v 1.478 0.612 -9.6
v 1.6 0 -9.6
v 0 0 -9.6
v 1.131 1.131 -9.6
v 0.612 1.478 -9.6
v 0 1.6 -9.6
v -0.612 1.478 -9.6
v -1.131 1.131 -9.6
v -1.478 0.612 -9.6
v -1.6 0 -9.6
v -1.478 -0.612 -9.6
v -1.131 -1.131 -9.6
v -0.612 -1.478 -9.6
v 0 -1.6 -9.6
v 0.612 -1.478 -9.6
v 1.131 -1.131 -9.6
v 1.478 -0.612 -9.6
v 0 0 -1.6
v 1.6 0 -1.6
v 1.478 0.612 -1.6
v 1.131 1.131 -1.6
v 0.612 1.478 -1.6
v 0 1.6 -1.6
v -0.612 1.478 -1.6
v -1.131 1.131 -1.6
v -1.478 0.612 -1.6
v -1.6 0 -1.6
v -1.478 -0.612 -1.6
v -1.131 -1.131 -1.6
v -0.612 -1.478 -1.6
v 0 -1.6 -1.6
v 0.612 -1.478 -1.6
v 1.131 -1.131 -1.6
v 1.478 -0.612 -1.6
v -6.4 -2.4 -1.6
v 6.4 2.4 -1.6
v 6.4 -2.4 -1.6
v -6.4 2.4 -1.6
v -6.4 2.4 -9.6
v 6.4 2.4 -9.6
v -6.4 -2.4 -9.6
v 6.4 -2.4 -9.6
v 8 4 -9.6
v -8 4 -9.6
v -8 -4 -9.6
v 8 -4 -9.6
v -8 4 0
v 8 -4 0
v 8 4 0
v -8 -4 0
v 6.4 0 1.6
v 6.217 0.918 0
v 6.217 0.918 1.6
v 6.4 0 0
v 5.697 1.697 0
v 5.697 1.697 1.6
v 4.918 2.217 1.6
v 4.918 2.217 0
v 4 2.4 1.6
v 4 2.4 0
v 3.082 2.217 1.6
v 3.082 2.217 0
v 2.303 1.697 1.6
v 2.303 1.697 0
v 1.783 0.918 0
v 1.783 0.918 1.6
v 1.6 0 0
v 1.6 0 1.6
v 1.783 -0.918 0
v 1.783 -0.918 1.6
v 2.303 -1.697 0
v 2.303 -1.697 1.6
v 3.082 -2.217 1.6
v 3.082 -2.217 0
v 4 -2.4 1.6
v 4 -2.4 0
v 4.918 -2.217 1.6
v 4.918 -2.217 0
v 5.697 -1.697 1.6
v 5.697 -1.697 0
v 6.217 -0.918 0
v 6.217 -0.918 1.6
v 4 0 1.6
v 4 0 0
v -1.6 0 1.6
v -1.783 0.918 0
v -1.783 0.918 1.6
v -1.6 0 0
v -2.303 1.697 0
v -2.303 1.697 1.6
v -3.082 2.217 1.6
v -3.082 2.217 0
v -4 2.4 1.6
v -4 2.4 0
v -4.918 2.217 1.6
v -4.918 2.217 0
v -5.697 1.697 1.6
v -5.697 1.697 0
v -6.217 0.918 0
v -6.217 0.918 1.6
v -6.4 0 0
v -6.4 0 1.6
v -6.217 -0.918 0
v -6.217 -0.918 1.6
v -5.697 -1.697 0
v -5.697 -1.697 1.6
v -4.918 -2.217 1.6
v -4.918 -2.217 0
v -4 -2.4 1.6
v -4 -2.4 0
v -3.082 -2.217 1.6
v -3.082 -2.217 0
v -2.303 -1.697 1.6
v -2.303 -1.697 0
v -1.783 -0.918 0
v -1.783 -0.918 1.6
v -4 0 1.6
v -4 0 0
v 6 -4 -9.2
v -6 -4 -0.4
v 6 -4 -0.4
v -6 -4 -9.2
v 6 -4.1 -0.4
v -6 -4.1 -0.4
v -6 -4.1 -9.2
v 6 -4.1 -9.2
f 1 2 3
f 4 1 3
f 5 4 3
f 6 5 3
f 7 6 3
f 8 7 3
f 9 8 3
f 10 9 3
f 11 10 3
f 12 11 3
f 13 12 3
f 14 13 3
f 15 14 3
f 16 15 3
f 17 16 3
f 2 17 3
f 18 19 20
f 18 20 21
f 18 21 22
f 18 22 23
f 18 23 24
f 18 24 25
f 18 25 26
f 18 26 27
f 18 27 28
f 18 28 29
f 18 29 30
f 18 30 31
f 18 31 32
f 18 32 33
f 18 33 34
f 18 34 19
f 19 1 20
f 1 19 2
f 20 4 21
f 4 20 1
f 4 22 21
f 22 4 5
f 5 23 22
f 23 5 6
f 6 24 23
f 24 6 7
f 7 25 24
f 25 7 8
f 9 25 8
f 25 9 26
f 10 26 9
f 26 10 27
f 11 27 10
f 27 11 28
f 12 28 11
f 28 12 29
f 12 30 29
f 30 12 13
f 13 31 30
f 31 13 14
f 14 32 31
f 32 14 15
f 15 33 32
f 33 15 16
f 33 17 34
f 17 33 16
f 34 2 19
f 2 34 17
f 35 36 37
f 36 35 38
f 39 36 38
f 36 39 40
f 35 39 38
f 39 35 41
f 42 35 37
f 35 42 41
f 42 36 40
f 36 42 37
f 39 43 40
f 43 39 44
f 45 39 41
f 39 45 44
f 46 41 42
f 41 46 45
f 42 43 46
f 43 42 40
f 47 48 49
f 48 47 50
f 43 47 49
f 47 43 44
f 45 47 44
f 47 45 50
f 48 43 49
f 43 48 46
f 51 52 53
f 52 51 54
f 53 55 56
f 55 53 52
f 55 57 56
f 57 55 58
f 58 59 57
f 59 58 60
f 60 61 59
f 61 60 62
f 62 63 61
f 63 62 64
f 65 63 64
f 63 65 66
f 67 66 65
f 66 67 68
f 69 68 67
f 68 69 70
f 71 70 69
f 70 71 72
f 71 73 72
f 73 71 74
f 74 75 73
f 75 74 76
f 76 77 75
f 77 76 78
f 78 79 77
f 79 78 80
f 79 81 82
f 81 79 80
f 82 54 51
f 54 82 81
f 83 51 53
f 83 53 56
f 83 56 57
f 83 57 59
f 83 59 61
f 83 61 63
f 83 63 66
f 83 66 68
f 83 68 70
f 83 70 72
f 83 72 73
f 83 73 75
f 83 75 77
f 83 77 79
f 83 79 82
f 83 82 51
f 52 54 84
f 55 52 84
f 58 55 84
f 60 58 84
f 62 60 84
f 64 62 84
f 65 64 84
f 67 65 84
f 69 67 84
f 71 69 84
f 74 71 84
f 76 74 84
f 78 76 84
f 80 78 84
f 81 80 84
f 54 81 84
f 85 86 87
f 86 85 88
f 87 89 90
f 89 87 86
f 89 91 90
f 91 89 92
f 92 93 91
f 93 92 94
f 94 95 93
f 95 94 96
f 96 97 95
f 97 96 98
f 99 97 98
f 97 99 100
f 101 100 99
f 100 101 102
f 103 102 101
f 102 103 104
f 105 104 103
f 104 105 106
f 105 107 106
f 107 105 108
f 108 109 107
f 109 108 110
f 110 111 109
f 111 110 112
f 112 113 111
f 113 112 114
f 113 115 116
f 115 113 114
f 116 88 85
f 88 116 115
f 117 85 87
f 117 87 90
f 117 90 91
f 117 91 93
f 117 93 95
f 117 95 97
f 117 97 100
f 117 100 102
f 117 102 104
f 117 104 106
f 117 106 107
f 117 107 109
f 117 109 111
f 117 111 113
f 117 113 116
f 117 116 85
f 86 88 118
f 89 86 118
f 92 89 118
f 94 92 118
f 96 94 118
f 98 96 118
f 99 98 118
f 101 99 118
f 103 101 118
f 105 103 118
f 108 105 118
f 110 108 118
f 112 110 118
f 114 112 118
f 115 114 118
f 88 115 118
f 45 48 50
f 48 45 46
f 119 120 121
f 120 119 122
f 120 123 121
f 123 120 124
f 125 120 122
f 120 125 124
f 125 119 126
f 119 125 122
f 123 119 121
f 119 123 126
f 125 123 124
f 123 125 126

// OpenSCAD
// file: ../p/4-4edge.scad
use <../lib.scad>
function ldraw_lib__4_4edge() = [
// 0 Circle 1.0
// 0 Name: 4-4edge.dat
// 0 Author: James Jessiman
// 0 !LDRAW_ORG Primitive UPDATE 2017-01
// 0 !LICENSE Licensed under CC BY 2.0 and CC BY 4.0 : see CAreadme.txt
// 
// 0 BFC CERTIFY CCW
  [0,"BFC","CERTIFY"],
  [0,"BFC","CCW"],
// 
// 0 !HISTORY 1998-12-15 [PTadmin] Official Update 1998-10
// 0 !HISTORY 2005-12-28 [PTadmin] Official Update 2005-01
// 0 !HISTORY 2007-06-24 [PTadmin] Header formatted for Contributor Agreement
// 0 !HISTORY 2008-07-01 [PTadmin] Official Update 2008-01
// 0 !HISTORY 2017-01-15 [Steffen] BFCed
// 0 !HISTORY 2017-12-30 [PTadmin] Official Update 2017-01
// 
// 
// 2 24 1 0 0 0.9239 0 0.3827
  [2,24,1,0,0,0.9239,0,0.3827],
// 2 24 0.9239 0 0.3827 0.7071 0 0.7071
  [2,24,0.9239,0,0.3827,0.7071,0,0.7071],
// 2 24 0.7071 0 0.7071 0.3827 0 0.9239
  [2,24,0.7071,0,0.7071,0.3827,0,0.9239],
// 2 24 0.3827 0 0.9239 0 0 1
  [2,24,0.3827,0,0.9239,0,0,1],
// 2 24 0 0 1 -0.3827 0 0.9239
  [2,24,0,0,1,-0.3827,0,0.9239],
// 2 24 -0.3827 0 0.9239 -0.7071 0 0.7071
  [2,24,-0.3827,0,0.9239,-0.7071,0,0.7071],
// 2 24 -0.7071 0 0.7071 -0.9239 0 0.3827
  [2,24,-0.7071,0,0.7071,-0.9239,0,0.3827],
// 2 24 -0.9239 0 0.3827 -1 0 -0
  [2,24,-0.9239,0,0.3827,-1,0,-0],
// 2 24 -1 0 -0 -0.9239 0 -0.3827
  [2,24,-1,0,-0,-0.9239,0,-0.3827],
// 2 24 -0.9239 0 -0.3827 -0.7071 0 -0.7071
  [2,24,-0.9239,0,-0.3827,-0.7071,0,-0.7071],
// 2 24 -0.7071 0 -0.7071 -0.3827 0 -0.9239
  [2,24,-0.7071,0,-0.7071,-0.3827,0,-0.9239],
// 2 24 -0.3827 0 -0.9239 0 0 -1
  [2,24,-0.3827,0,-0.9239,0,0,-1],
// 2 24 0 0 -1 0.3827 0 -0.9239
  [2,24,0,0,-1,0.3827,0,-0.9239],
// 2 24 0.3827 0 -0.9239 0.7071 0 -0.7071
  [2,24,0.3827,0,-0.9239,0.7071,0,-0.7071],
// 2 24 0.7071 0 -0.7071 0.9239 0 -0.3827
  [2,24,0.7071,0,-0.7071,0.9239,0,-0.3827],
// 2 24 0.9239 0 -0.3827 1 0 0
  [2,24,0.9239,0,-0.3827,1,0,0],
];
module ldraw_lib__4_4edge(step=0, col=false, unit=2/5, alt=false, line=0.2, solid=!$preview)
    makepoly(ldraw_lib__4_4edge(), step=step, col=col, unit=unit, alt=alt, line=line, solid=solid);
ldraw_lib__4_4edge(line=0.2);
// file: ../p/4-4disc.scad
use <../lib.scad>
function ldraw_lib__4_4disc() = [
// 0 Disc 1.0
// 0 Name: 4-4disc.dat
// 0 Author: James Jessiman
// 0 !LDRAW_ORG Primitive UPDATE 2002-02
// 0 !LICENSE Licensed under CC BY 2.0 and CC BY 4.0 : see CAreadme.txt
// 
// 0 BFC CERTIFY CCW
  [0,"BFC","CERTIFY"],
  [0,"BFC","CCW"],
// 
// 0 !HISTORY 1998-12-15 [PTadmin] Official Update 1998-10
// 0 !HISTORY 2002-03-23 [sbliss] Added BFC statement
// 0 !HISTORY 2002-04-25 [PTadmin] Official Update 2002-02
// 0 !HISTORY 2007-06-24 [PTadmin] Header formatted for Contributor Agreement
// 0 !HISTORY 2008-07-01 [PTadmin] Official Update 2008-01
// 
// 
// 3 16 0 0 0 1 0 0 0.9239 0 0.3827
  [3,16,0,0,0,1,0,0,0.9239,0,0.3827],
// 3 16 0 0 0 0.9239 0 0.3827 0.7071 0 0.7071
  [3,16,0,0,0,0.9239,0,0.3827,0.7071,0,0.7071],
// 3 16 0 0 0 0.7071 0 0.7071 0.3827 0 0.9239
  [3,16,0,0,0,0.7071,0,0.7071,0.3827,0,0.9239],
// 3 16 0 0 0 0.3827 0 0.9239 0 0 1
  [3,16,0,0,0,0.3827,0,0.9239,0,0,1],
// 3 16 0 0 0 0 0 1 -0.3827 0 0.9239
  [3,16,0,0,0,0,0,1,-0.3827,0,0.9239],
// 3 16 0 0 0 -0.3827 0 0.9239 -0.7071 0 0.7071
  [3,16,0,0,0,-0.3827,0,0.9239,-0.7071,0,0.7071],
// 3 16 0 0 0 -0.7071 0 0.7071 -0.9239 0 0.3827
  [3,16,0,0,0,-0.7071,0,0.7071,-0.9239,0,0.3827],
// 3 16 0 0 0 -0.9239 0 0.3827 -1 0 -0
  [3,16,0,0,0,-0.9239,0,0.3827,-1,0,-0],
// 3 16 0 0 0 -1 0 -0 -0.9239 0 -0.3827
  [3,16,0,0,0,-1,0,-0,-0.9239,0,-0.3827],
// 3 16 0 0 0 -0.9239 0 -0.3827 -0.7071 0 -0.7071
  [3,16,0,0,0,-0.9239,0,-0.3827,-0.7071,0,-0.7071],
// 3 16 0 0 0 -0.7071 0 -0.7071 -0.3827 0 -0.9239
  [3,16,0,0,0,-0.7071,0,-0.7071,-0.3827,0,-0.9239],
// 3 16 0 0 0 -0.3827 0 -0.9239 0 0 -1
  [3,16,0,0,0,-0.3827,0,-0.9239,0,0,-1],
// 3 16 0 0 0 0 0 -1 0.3827 0 -0.9239
  [3,16,0,0,0,0,0,-1,0.3827,0,-0.9239],
// 3 16 0 0 0 0.3827 0 -0.9239 0.7071 0 -0.7071
  [3,16,0,0,0,0.3827,0,-0.9239,0.7071,0,-0.7071],
// 3 16 0 0 0 0.7071 0 -0.7071 0.9239 0 -0.3827
  [3,16,0,0,0,0.7071,0,-0.7071,0.9239,0,-0.3827],
// 3 16 0 0 0 0.9239 0 -0.3827 1 0 0
  [3,16,0,0,0,0.9239,0,-0.3827,1,0,0],
// 0
];
module ldraw_lib__4_4disc(step=0, col=false, unit=2/5, alt=false, line=0.2, solid=!$preview)
    makepoly(ldraw_lib__4_4disc(), step=step, col=col, unit=unit, alt=alt, line=line, solid=solid);
ldraw_lib__4_4disc(line=0.2);
// file: ../p/4-4cyli.scad
use <../lib.scad>
$fa=1; $fs=0.2;
function ldraw_lib__4_4cyli(realsolid=false) = [
// 0 Cylinder 1.0
// 0 Name: 4-4cyli.dat
// 0 Author: James Jessiman
// 0 !LDRAW_ORG Primitive UPDATE 2005-01
// 0 !LICENSE Licensed under CC BY 2.0 and CC BY 4.0 : see CAreadme.txt
// 
// 0 BFC CERTIFY CCW
  [0,"BFC","CERTIFY"],
  [0,"BFC","CCW"],
// 
// 0 !HISTORY 1998-12-15 [PTadmin] Official Update 1998-10
// 0 !HISTORY 2002-03-23 [sbliss] Added BFC statement; merged headers from files in distributions LDraw 0.27 and Complete.
// 0 !HISTORY 2002-04-25 [PTadmin] Official Update 2002-02
// 0 !HISTORY 2004-12-14 [guyvivan] BFC CCW
// 0 !HISTORY 2005-12-28 [PTadmin] Official Update 2005-01
// 0 !HISTORY 2007-06-24 [PTadmin] Header formatted for Contributor Agreement
// 0 !HISTORY 2008-07-01 [PTadmin] Official Update 2008-01
// 
// 
// 4 16 1 1 0 0.9239 1 0.3827 0.9239 0 0.3827 1 0 0
  [4,16,1,1,0,0.9239,1,0.3827,0.9239,0,0.3827,1,0,0],
// 5 24 1 0 0 1 1 0 0.9239 0 0.3827 0.9239 0 -0.3827
  [5,24,1,0,0,1,1,0,0.9239,0,0.3827,0.9239,0,-0.3827],
// 4 16 0.9239 1 0.3827 0.7071 1 0.7071 0.7071 0 0.7071 0.9239 0 0.3827
  [4,16,0.9239,1,0.3827,0.7071,1,0.7071,0.7071,0,0.7071,0.9239,0,0.3827],
// 5 24 0.9239 0 0.3827 0.9239 1 0.3827 0.7071 0 0.7071 1 0 0
  [5,24,0.9239,0,0.3827,0.9239,1,0.3827,0.7071,0,0.7071,1,0,0],
// 4 16 0.7071 1 0.7071 0.3827 1 0.9239 0.3827 0 0.9239 0.7071 0 0.7071
  [4,16,0.7071,1,0.7071,0.3827,1,0.9239,0.3827,0,0.9239,0.7071,0,0.7071],
// 5 24 0.7071 0 0.7071 0.7071 1 0.7071 0.3827 0 0.9239 0.9239 0 0.3827
  [5,24,0.7071,0,0.7071,0.7071,1,0.7071,0.3827,0,0.9239,0.9239,0,0.3827],
// 4 16 0.3827 1 0.9239 0 1 1 0 0 1 0.3827 0 0.9239
  [4,16,0.3827,1,0.9239,0,1,1,0,0,1,0.3827,0,0.9239],
// 5 24 0.3827 0 0.9239 0.3827 1 0.9239 0 0 1 0.7071 0 0.7071
  [5,24,0.3827,0,0.9239,0.3827,1,0.9239,0,0,1,0.7071,0,0.7071],
// 4 16 0 1 1 -0.3827 1 0.9239 -0.3827 0 0.9239 0 0 1
  [4,16,0,1,1,-0.3827,1,0.9239,-0.3827,0,0.9239,0,0,1],
// 5 24 0 0 1 0 1 1 -0.3827 0 0.9239 0.3827 0 0.9239
  [5,24,0,0,1,0,1,1,-0.3827,0,0.9239,0.3827,0,0.9239],
// 4 16 -0.3827 1 0.9239 -0.7071 1 0.7071 -0.7071 0 0.7071 -0.3827 0 0.9239
  [4,16,-0.3827,1,0.9239,-0.7071,1,0.7071,-0.7071,0,0.7071,-0.3827,0,0.9239],
// 5 24 -0.3827 0 0.9239 -0.3827 1 0.9239 -0.7071 0 0.7071 0 0 1
  [5,24,-0.3827,0,0.9239,-0.3827,1,0.9239,-0.7071,0,0.7071,0,0,1],
// 4 16 -0.7071 1 0.7071 -0.9239 1 0.3827 -0.9239 0 0.3827 -0.7071 0 0.7071
  [4,16,-0.7071,1,0.7071,-0.9239,1,0.3827,-0.9239,0,0.3827,-0.7071,0,0.7071],
// 5 24 -0.7071 0 0.7071 -0.7071 1 0.7071 -0.9239 0 0.3827 -0.3827 0 0.9239
  [5,24,-0.7071,0,0.7071,-0.7071,1,0.7071,-0.9239,0,0.3827,-0.3827,0,0.9239],
// 4 16 -0.9239 1 0.3827 -1 1 0 -1 0 0 -0.9239 0 0.3827
  [4,16,-0.9239,1,0.3827,-1,1,0,-1,0,0,-0.9239,0,0.3827],
// 5 24 -0.9239 0 0.3827 -0.9239 1 0.3827 -1 0 0 -0.7071 0 0.7071
  [5,24,-0.9239,0,0.3827,-0.9239,1,0.3827,-1,0,0,-0.7071,0,0.7071],
// 4 16 -1 1 0 -0.9239 1 -0.3827 -0.9239 0 -0.3827 -1 0 0
  [4,16,-1,1,0,-0.9239,1,-0.3827,-0.9239,0,-0.3827,-1,0,0],
// 5 24 -1 0 0 -1 1 0 -0.9239 0 -0.3827 -0.9239 0 0.3827
  [5,24,-1,0,0,-1,1,0,-0.9239,0,-0.3827,-0.9239,0,0.3827],
// 4 16 -0.9239 1 -0.3827 -0.7071 1 -0.7071 -0.7071 0 -0.7071 -0.9239 0 -0.3827
  [4,16,-0.9239,1,-0.3827,-0.7071,1,-0.7071,-0.7071,0,-0.7071,-0.9239,0,-0.3827],
// 5 24 -0.9239 0 -0.3827 -0.9239 1 -0.3827 -0.7071 0 -0.7071 -1 0 0
  [5,24,-0.9239,0,-0.3827,-0.9239,1,-0.3827,-0.7071,0,-0.7071,-1,0,0],
// 4 16 -0.7071 1 -0.7071 -0.3827 1 -0.9239 -0.3827 0 -0.9239 -0.7071 0 -0.7071
  [4,16,-0.7071,1,-0.7071,-0.3827,1,-0.9239,-0.3827,0,-0.9239,-0.7071,0,-0.7071],
// 5 24 -0.7071 0 -0.7071 -0.7071 1 -0.7071 -0.3827 0 -0.9239 -0.9239 0 -0.3827
  [5,24,-0.7071,0,-0.7071,-0.7071,1,-0.7071,-0.3827,0,-0.9239,-0.9239,0,-0.3827],
// 4 16 -0.3827 1 -0.9239 0 1 -1 0 0 -1 -0.3827 0 -0.9239
  [4,16,-0.3827,1,-0.9239,0,1,-1,0,0,-1,-0.3827,0,-0.9239],
// 5 24 -0.3827 0 -0.9239 -0.3827 1 -0.9239 0 0 -1 -0.7071 0 -0.7071
  [5,24,-0.3827,0,-0.9239,-0.3827,1,-0.9239,0,0,-1,-0.7071,0,-0.7071],
// 4 16 0 1 -1 0.3827 1 -0.9239 0.3827 0 -0.9239 0 0 -1
  [4,16,0,1,-1,0.3827,1,-0.9239,0.3827,0,-0.9239,0,0,-1],
// 5 24 0 0 -1 0 1 -1 0.3827 0 -0.9239 -0.3827 0 -0.9239
  [5,24,0,0,-1,0,1,-1,0.3827,0,-0.9239,-0.3827,0,-0.9239],
// 4 16 0.3827 1 -0.9239 0.7071 1 -0.7071 0.7071 0 -0.7071 0.3827 0 -0.9239
  [4,16,0.3827,1,-0.9239,0.7071,1,-0.7071,0.7071,0,-0.7071,0.3827,0,-0.9239],
// 5 24 0.3827 0 -0.9239 0.3827 1 -0.9239 0.7071 0 -0.7071 0 0 -1
  [5,24,0.3827,0,-0.9239,0.3827,1,-0.9239,0.7071,0,-0.7071,0,0,-1],
// 4 16 0.7071 1 -0.7071 0.9239 1 -0.3827 0.9239 0 -0.3827 0.7071 0 -0.7071
  [4,16,0.7071,1,-0.7071,0.9239,1,-0.3827,0.9239,0,-0.3827,0.7071,0,-0.7071],
// 5 24 0.7071 0 -0.7071 0.7071 1 -0.7071 0.9239 0 -0.3827 0.3827 0 -0.9239
  [5,24,0.7071,0,-0.7071,0.7071,1,-0.7071,0.9239,0,-0.3827,0.3827,0,-0.9239],
// 4 16 0.9239 1 -0.3827 1 1 0 1 0 0 0.9239 0 -0.3827
  [4,16,0.9239,1,-0.3827,1,1,0,1,0,0,0.9239,0,-0.3827],
// 5 24 0.9239 0 -0.3827 0.9239 1 -0.3827 1 0 0 0.7071 0 -0.7071
  [5,24,0.9239,0,-0.3827,0.9239,1,-0.3827,1,0,0,0.7071,0,-0.7071],
// 0
];
module ldraw_lib__4_4cyli(step=0, col=false, unit=2/5, alt=false, line=0.2, solid=!$preview)
    makepoly(ldraw_lib__4_4cyli(solid), step=step, col=col, unit=unit, alt=alt, line=line, solid=solid);
ldraw_lib__4_4cyli(line=0.2);
// file: ../p/stud3.scad
use <../lib.scad>
use <4-4cyli.scad>
use <4-4disc.scad>
use <4-4edge.scad>
function ldraw_lib__stud3() = [
// 0 Stud Tube Solid
// 0 Name: stud3.dat
// 0 Author: James Jessiman
// 0 !LDRAW_ORG Primitive UPDATE 2012-01
// 0 !LICENSE Licensed under CC BY 4.0 : see CAreadme.txt
// 
// 0 BFC CERTIFY CCW
  [0,"BFC","CERTIFY"],
  [0,"BFC","CCW"],
// 
// 0 !HISTORY 2002-04-04 [sbliss] Modified for BFC compliance
// 0 !HISTORY 2002-04-25 [PTadmin] Official Update 2002-02
// 0 !HISTORY 2007-06-24 [PTadmin] Header formatted for Contributor Agreement
// 0 !HISTORY 2008-07-01 [PTadmin] Official Update 2008-01
// 0 !HISTORY 2012-02-16 [Philo] Changed to CCW
// 0 !HISTORY 2012-03-30 [PTadmin] Official Update 2012-01
// 
// 
// 1 16 0 -4 0 4 0 0 0 1 0 0 0 4 4-4edge.dat
  [1,16,0,-4,0,4,0,0,0,1,0,0,0,4, ldraw_lib__4_4edge()],
// 1 16 0 0 0 4 0 0 0 1 0 0 0 4 4-4edge.dat
  [1,16,0,0,0,4,0,0,0,1,0,0,0,4, ldraw_lib__4_4edge()],
// 1 16 0 -4 0 4 0 0 0 1 0 0 0 4 4-4disc.dat
  [1,16,0,-4,0,4,0,0,0,1,0,0,0,4, ldraw_lib__4_4disc()],
  [-1,16,0,0,0,4,0,0,0,-1,0,0,0,4, ldraw_lib__4_4disc()],
// 1 16 0 -4 0 4 0 0 0 4 0 0 0 4 4-4cyli.dat
  [1,16,0,-4,0,4,0,0,0,4,0,0,0,4, ldraw_lib__4_4cyli()],
];
module ldraw_lib__stud3(step=0, col=false, unit=2/5, alt=false, line=0.2, solid=!$preview)
    makepoly(ldraw_lib__stud3(), step=step, col=col, unit=unit, alt=alt, line=line, solid=solid);
ldraw_lib__stud3(line=0.2);
// file: ../p/stud.scad
use <../lib.scad>
use <4-4cyli.scad>
use <4-4disc.scad>
use <4-4edge.scad>
function ldraw_lib__stud() = [
// 0 Stud
// 0 Name: stud.dat
// 0 Author: James Jessiman
// 0 !LDRAW_ORG Primitive UPDATE 2012-01
// 0 !LICENSE Licensed under CC BY 4.0 : see CAreadme.txt
// 
// 0 BFC CERTIFY CCW
  [0,"BFC","CERTIFY"],
  [0,"BFC","CCW"],
// 
// 0 !HISTORY 2002-04-04 [sbliss] Modified for BFC compliance
// 0 !HISTORY 2002-04-25 [PTadmin] Official Update 2002-02
// 0 !HISTORY 2007-06-24 [PTadmin] Header formatted for Contributor Agreement
// 0 !HISTORY 2008-07-01 [PTadmin] Official Update 2008-01
// 0 !HISTORY 2012-02-16 [Philo] Changed to CCW
// 0 !HISTORY 2012-03-30 [PTadmin] Official Update 2012-01
// 
// 
// 1 16 0 0 0 6 0 0 0 1 0 0 0 6 4-4edge.dat
  [1,16,0,0,0,6,0,0,0,1,0,0,0,6, ldraw_lib__4_4edge()],
// 1 16 0 -4 0 6 0 0 0 1 0 0 0 6 4-4edge.dat
  [1,16,0,-4,0,6,0,0,0,1,0,0,0,6, ldraw_lib__4_4edge()],
// 1 16 0 0 0 6 0 0 0 -4 0 0 0 6 4-4cyli.dat
  [1,16,0,0,0,6,0,0,0,-4,0,0,0,6, ldraw_lib__4_4cyli()],
// 1 16 0 -4 0 6 0 0 0 1 0 0 0 6 4-4disc.dat
  [1,16,0,-4,0,6,0,0,0,1,0,0,0,6, ldraw_lib__4_4disc()],
  [-1,16,0,0,0,6,0,0,0,-1,0,0,0,6, ldraw_lib__4_4disc()],
];
module ldraw_lib__stud(step=0, col=false, unit=2/5, alt=false, line=0.2, solid=!$preview)
    makepoly(ldraw_lib__stud(), step=step, col=col, unit=unit, alt=alt, line=line, solid=solid);
ldraw_lib__stud(line=0.2);
// file: ../p/box5.scad
use <../lib.scad>
function ldraw_lib__box5() = [
// 0 Box with 5 Faces and All Edges
// 0 Name: box5.dat
// 0 Author: James Jessiman
// 0 !LDRAW_ORG Primitive UPDATE 2012-01
// 0 !LICENSE Licensed under CC BY 2.0 and CC BY 4.0 : see CAreadme.txt
// 
// 0 BFC CERTIFY CCW
  [0,"BFC","CERTIFY"],
  [0,"BFC","CCW"],
// 
// 0 !HISTORY 2002-04-03 [sbliss] Modified for BFC compliance
// 0 !HISTORY 2002-04-25 [PTadmin] Official Update 2002-02
// 0 !HISTORY 2007-06-24 [PTadmin] Header formatted for Contributor Agreement
// 0 !HISTORY 2008-07-01 [PTadmin] Official Update 2008-01
// 0 !HISTORY 2012-02-16 [Philo] Changed to CCW
// 0 !HISTORY 2012-03-30 [PTadmin] Official Update 2012-01
// 
// 
// 2 24 1 1 1 -1 1 1
  [2,24,1,1,1,-1,1,1],
// 2 24 -1 1 1 -1 1 -1
  [2,24,-1,1,1,-1,1,-1],
// 2 24 -1 1 -1 1 1 -1
  [2,24,-1,1,-1,1,1,-1],
// 2 24 1 1 -1 1 1 1
  [2,24,1,1,-1,1,1,1],
// 2 24 1 0 1 -1 0 1
  [2,24,1,0,1,-1,0,1],
// 2 24 -1 0 1 -1 0 -1
  [2,24,-1,0,1,-1,0,-1],
// 2 24 -1 0 -1 1 0 -1
  [2,24,-1,0,-1,1,0,-1],
// 2 24 1 0 -1 1 0 1
  [2,24,1,0,-1,1,0,1],
// 2 24 1 0 1 1 1 1
  [2,24,1,0,1,1,1,1],
// 2 24 -1 0 1 -1 1 1
  [2,24,-1,0,1,-1,1,1],
// 2 24 1 0 -1 1 1 -1
  [2,24,1,0,-1,1,1,-1],
// 2 24 -1 0 -1 -1 1 -1
  [2,24,-1,0,-1,-1,1,-1],
// 4 16 -1 1 1 1 1 1 1 1 -1 -1 1 -1
  [4,16,-1,1,1,1,1,1,1,1,-1,-1,1,-1],
// 4 16 -1 1 1 -1 0 1 1 0 1 1 1 1
  [4,16,-1,1,1,-1,0,1,1,0,1,1,1,1],
// 4 16 -1 1 -1 -1 0 -1 -1 0 1 -1 1 1
  [4,16,-1,1,-1,-1,0,-1,-1,0,1,-1,1,1],
// 4 16 1 1 -1 1 0 -1 -1 0 -1 -1 1 -1
  [4,16,1,1,-1,1,0,-1,-1,0,-1,-1,1,-1],
// 4 16 1 1 1 1 0 1 1 0 -1 1 1 -1
  [4,16,1,1,1,1,0,1,1,0,-1,1,1,-1],
];
makepoly(ldraw_lib__box5(), line=0.2);
// file: ../p/box4t.scad
use <../lib.scad>
function ldraw_lib__box4t() = [
// 0 Box with 4 Adjacent Faces and All Edges
// 0 Name: box4t.dat
// 0 Author: Tore Eriksson [Tore_Eriksson]
// 0 !LDRAW_ORG Primitive UPDATE 2003-02
// 0 !LICENSE Licensed under CC BY 2.0 and CC BY 4.0 : see CAreadme.txt
// 
// 0 BFC CERTIFY CCW
  [0,"BFC","CERTIFY"],
  [0,"BFC","CCW"],
// 
// 0 !HISTORY 1997-09-29 [PTadmin] Official Update 1997-15
// 0 !HISTORY 2002-08-31 [izanette] Modified with WINDZ for BFC compliance
// 0 !HISTORY 2003-08-01 [PTadmin] Official Update 2003-02
// 0 !HISTORY 2007-06-24 [PTadmin] Header formatted for Contributor Agreement
// 0 !HISTORY 2008-07-01 [PTadmin] Official Update 2008-01
// 
// 
// 2 24 1 1 1 -1 1 1
  [2,24,1,1,1,-1,1,1],
// 2 24 -1 1 1 -1 1 -1
  [2,24,-1,1,1,-1,1,-1],
// 2 24 -1 1 -1 1 1 -1
  [2,24,-1,1,-1,1,1,-1],
// 2 24 1 1 -1 1 1 1
  [2,24,1,1,-1,1,1,1],
// 2 24 1 0 1 -1 0 1
  [2,24,1,0,1,-1,0,1],
// 2 24 -1 0 1 -1 0 -1
  [2,24,-1,0,1,-1,0,-1],
// 2 24 -1 0 -1 1 0 -1
  [2,24,-1,0,-1,1,0,-1],
// 2 24 1 0 -1 1 0 1
  [2,24,1,0,-1,1,0,1],
// 2 24 1 0 1 1 1 1
  [2,24,1,0,1,1,1,1],
// 2 24 -1 0 1 -1 1 1
  [2,24,-1,0,1,-1,1,1],
// 2 24 1 0 -1 1 1 -1
  [2,24,1,0,-1,1,1,-1],
// 2 24 -1 0 -1 -1 1 -1
  [2,24,-1,0,-1,-1,1,-1],
// 4 16 1 1 1 1 1 -1 -1 1 -1 -1 1 1
  [4,16,1,1,1,1,1,-1,-1,1,-1,-1,1,1],
// 4 16 1 1 1 -1 1 1 -1 0 1 1 0 1
  [4,16,1,1,1,-1,1,1,-1,0,1,1,0,1],
// 4 16 -1 1 1 -1 1 -1 -1 0 -1 -1 0 1
  [4,16,-1,1,1,-1,1,-1,-1,0,-1,-1,0,1],
// 0 4 16 -1 1 -1 -1 0 -1 1 0 -1 1 1 -1
// 4 16 1 1 -1 1 1 1 1 0 1 1 0 -1
  [4,16,1,1,-1,1,1,1,1,0,1,1,0,-1],
// 0
];
makepoly(ldraw_lib__box4t(), line=0.2);
// file: s/3004s01.scad
use <../../lib.scad>
use <../../p/box4t.scad>
use <../../p/box5.scad>
use <../../p/stud.scad>
use <../../p/stud3.scad>
$fa=1; $fs=0.2;
function ldraw_lib__s__3004s01(realsolid=false) = [
// 0 ~Brick  1 x  2 without Front Face
// 0 Name: s\3004s01.dat
// 0 Author: James Jessiman
// 0 !LDRAW_ORG Subpart UPDATE 2003-03
// 0 !LICENSE Licensed under CC BY 2.0 and CC BY 4.0 : see CAreadme.txt
// 
// 0 BFC CERTIFY CCW
  [0,"BFC","CERTIFY"],
  [0,"BFC","CCW"],
// 
// 0 !HISTORY 2003-09-07 [jriley] Subfiling, BFC
// 0 !HISTORY 2003-12-19 [PTadmin] Official Update 2003-03
// 0 !HISTORY 2007-08-29 [PTadmin] Header formatted for Contributor Agreement
// 0 !HISTORY 2008-07-01 [PTadmin] Official Update 2008-01
// 
// 
// 1 16 0 4 0 1 0 0 0 -5 0 0 0 1 stud3.dat
  [1,16,0,4,0,1,0,0,0,-5,0,0,0,1, ldraw_lib__stud3(realsolid)],
// 0 BFC INVERTNEXT
  [0,"BFC","INVERTNEXT"],
// 1 16 0 24 0 16 0 0 0 -20 0 0 0 6 box5.dat
  [1,16,0,24,0,16,0,0,0,-20,0,0,0,6, ldraw_lib__box5(realsolid)],
// 4 16 20 24 10 16 24 6 -16 24 6 -20 24 10
  [4,16,20,24,10,16,24,6,-16,24,6,-20,24,10],
// 4 16 -20 24 10 -16 24 6 -16 24 -6 -20 24 -10
  [4,16,-20,24,10,-16,24,6,-16,24,-6,-20,24,-10],
// 4 16 -20 24 -10 -16 24 -6 16 24 -6 20 24 -10
  [4,16,-20,24,-10,-16,24,-6,16,24,-6,20,24,-10],
// 4 16 20 24 -10 16 24 -6 16 24 6 20 24 10
  [4,16,20,24,-10,16,24,-6,16,24,6,20,24,10],
// 1 16 0 24 0 20 0 0 0 -24 0 0 0 10 box4t.dat
  [1,16,0,24,0,20,0,0,0,-24,0,0,0,10, ldraw_lib__box4t(realsolid)],
// 1 16 10 0 0 1 0 0 0 1 0 0 0 1 stud.dat
  [1,16,10,0,0,1,0,0,0,1,0,0,0,1, ldraw_lib__stud(realsolid)],
// 1 16 -10 0 0 1 0 0 0 1 0 0 0 1 stud.dat
  [1,16,-10,0,0,1,0,0,0,1,0,0,0,1, ldraw_lib__stud(realsolid)],
// 0
];
module ldraw_lib__s__3004s01(step=0, col=false, unit=2/5, alt=false, line=0.2, solid=!$preview)
    makepoly(ldraw_lib__s__3004s01(solid), step=step, col=col, unit=unit, alt=alt, line=line, solid=solid);
ldraw_lib__s__3004s01(line=0.2);
// file: ../p/box5-12.scad
use <../lib.scad>
function ldraw_lib__box5_12() = [
// 0 Box with 5 Faces without Any Edges
// 0 Name: box5-12.dat
// 0 Author: Chris Dee [cwdee]
// 0 !LDRAW_ORG Primitive UPDATE 2009-02
// 0 !LICENSE Licensed under CC BY 2.0 and CC BY 4.0 : see CAreadme.txt
// 
// 0 BFC CERTIFY CCW
  [0,"BFC","CERTIFY"],
  [0,"BFC","CCW"],
// 
// 0 !HISTORY 2009-09-03 [PTadmin] Official Update 2009-02
// 
// 
// 4 16 1 1 1 1 1 -1 -1 1 -1 -1 1 1
  [4,16,1,1,1,1,1,-1,-1,1,-1,-1,1,1],
// 4 16 -1 0 1 1 0 1 1 1 1 -1 1 1
  [4,16,-1,0,1,1,0,1,1,1,1,-1,1,1],
// 4 16 -1 0 -1 -1 0 1 -1 1 1 -1 1 -1
  [4,16,-1,0,-1,-1,0,1,-1,1,1,-1,1,-1],
// 4 16 1 0 -1 -1 0 -1 -1 1 -1 1 1 -1
  [4,16,1,0,-1,-1,0,-1,-1,1,-1,1,1,-1],
// 4 16 1 0 1 1 0 -1 1 1 -1 1 1 1
  [4,16,1,0,1,1,0,-1,1,1,-1,1,1,1],
// 0
];
module ldraw_lib__box5_12(step=0, col=false, unit=2/5, alt=false, line=0.2, solid=!$preview)
    makepoly(ldraw_lib__box5_12(), step=step, col=col, unit=unit, alt=alt, line=line, solid=solid);
ldraw_lib__box5_12(line=0.2);
// file: 3004.scad
use <../lib.scad>
use <s/3004s01.scad>
function ldraw_lib__3004() = [
// 0 Brick  1 x  2
// 0 Name: 3004.dat
// 0 Author: James Jessiman
// 0 !LDRAW_ORG Part UPDATE 2022-05
// 0 !LICENSE Licensed under CC BY 2.0 and CC BY 4.0 : see CAreadme.txt
// 
// 0 BFC CERTIFY CCW
  [0,"BFC","CERTIFY"],
  [0,"BFC","CCW"],
// 
// 0 !HISTORY 2001-10-26 [PTadmin] Official Update 2001-01
// 0 !HISTORY 2002-05-07 {unknown} BFC Certification
// 0 !HISTORY 2002-06-11 [PTadmin] Official Update 2002-03
// 0 !HISTORY 2007-05-07 [PTadmin] Header formatted for Contributor Agreement
// 0 !HISTORY 2008-07-01 [PTadmin] Official Update 2008-01
// 0 !HISTORY 2022-08-04 [MagFors] Using subfile
// 0 !HISTORY 2022-09-15 [PTadmin] Official Update 2022-05
// 
// 
// 1 16 0 0 0 1 0 0 0 1 0 0 0 1 s\3004s01.dat
  [1,16,0,0,0,1,0,0,0,1,0,0,0,1, ldraw_lib__s__3004s01()],
// 4 16 -20 24 -10 20 24 -10 20 0 -10 -20 0 -10
  [4,16,-20,24,-10,20,24,-10,20,0,-10,-20,0,-10],
];
module ldraw_lib__3004(step=0, col=false, unit=2/5, alt=false, line=0.2, solid=!$preview)
    makepoly(ldraw_lib__3004(), step=step, col=col, unit=unit, alt=alt, line=line, solid=solid);
ldraw_lib__3004(line=0.2);
// file: 192375d.scad
use <../lib.scad>
use <../p/box5-12.scad>
$fa=1; $fs=0.2;
function ldraw_lib__192375d(realsolid=false) = [
// 0 Sticker  1.1 x  1.5 with Red Rectangle
// 0 Name: 192375d.dat
// 0 Author: Takeshi Takahashi [RainbowDolphin]
// 0 !LDRAW_ORG Part UPDATE 2022-05
// 0 !LICENSE Licensed under CC BY 2.0 and CC BY 4.0 : see CAreadme.txt
// 
// 0 BFC CERTIFY CCW
  [0,"BFC","CERTIFY"],
  [0,"BFC","CCW"],
// 
// 0 !KEYWORDS Exxon, Gas Station, Set 6375-2
// 
// 0 !HISTORY 2022-09-15 [PTadmin] Official Update 2022-05
// 
// 
// 1 16 0 -0.25 0 15 0 0 0 0.25 0 0 0 11 box5-12.dat
  [1,16,0,-0.25,0,15,0,0,0,0.25,0,0,0,11, ldraw_lib__box5_12(realsolid)],
// 
// 4 4 15 -0.25 11 -15 -0.25 11 -15 -0.25 -11 15 -0.25 -11
  [4,4,15,-0.25,11,-15,-0.25,11,-15,-0.25,-11,15,-0.25,-11],
];
module ldraw_lib__192375d(step=0, col=false, unit=2/5, alt=false, line=0.2, solid=!$preview)
    makepoly(ldraw_lib__192375d(solid), step=step, col=col, unit=unit, alt=alt, line=line, solid=solid);
ldraw_lib__192375d(line=0.2);
// main file
use <../lib.scad>
use <192375d.scad>
use <3004.scad>
function ldraw_lib__3004d0i() = [
// 0 Brick  1 x  2 with Red Rectangle Sticker
// 0 Name: 3004d0i.dat
// 0 Author: Takeshi Takahashi [RainbowDolphin]
// 0 !LDRAW_ORG Shortcut UPDATE 2024-05
// 0 !LICENSE Licensed under CC BY 4.0 : see CAreadme.txt
// 
// 0 BFC CERTIFY CCW
  [0,"BFC","CERTIFY"],
  [0,"BFC","CCW"],
// 
// 0 !CATEGORY Sticker Shortcut
// 0 !KEYWORDS Bricklink 3004pb070, Gas Station, Set 6375-2
// 
// 0 !HISTORY 2024-06-30 [OrionP] Official Update 2024-05
// 
// 1 16 0 0 0 1 0 0 0 1 0 0 0 1 3004.dat
  [1,16,0,0,0,1,0,0,0,1,0,0,0,1, ldraw_lib__3004()],
// 1 16 0 12 -10 1 0 0 0 0 -1 0 1 0 192375d.dat
  [1,16,0,12,-10,1,0,0,0,0,-1,0,1,0, ldraw_lib__192375d()],
];
module ldraw_lib__3004d0i(step=0, col=false, unit=2/5, alt=false, line=0.2, solid=!$preview)
    makepoly(ldraw_lib__3004d0i(), step=step, col=col, unit=unit, alt=alt, line=line, solid=solid);
ldraw_lib__3004d0i(line=0.2);
